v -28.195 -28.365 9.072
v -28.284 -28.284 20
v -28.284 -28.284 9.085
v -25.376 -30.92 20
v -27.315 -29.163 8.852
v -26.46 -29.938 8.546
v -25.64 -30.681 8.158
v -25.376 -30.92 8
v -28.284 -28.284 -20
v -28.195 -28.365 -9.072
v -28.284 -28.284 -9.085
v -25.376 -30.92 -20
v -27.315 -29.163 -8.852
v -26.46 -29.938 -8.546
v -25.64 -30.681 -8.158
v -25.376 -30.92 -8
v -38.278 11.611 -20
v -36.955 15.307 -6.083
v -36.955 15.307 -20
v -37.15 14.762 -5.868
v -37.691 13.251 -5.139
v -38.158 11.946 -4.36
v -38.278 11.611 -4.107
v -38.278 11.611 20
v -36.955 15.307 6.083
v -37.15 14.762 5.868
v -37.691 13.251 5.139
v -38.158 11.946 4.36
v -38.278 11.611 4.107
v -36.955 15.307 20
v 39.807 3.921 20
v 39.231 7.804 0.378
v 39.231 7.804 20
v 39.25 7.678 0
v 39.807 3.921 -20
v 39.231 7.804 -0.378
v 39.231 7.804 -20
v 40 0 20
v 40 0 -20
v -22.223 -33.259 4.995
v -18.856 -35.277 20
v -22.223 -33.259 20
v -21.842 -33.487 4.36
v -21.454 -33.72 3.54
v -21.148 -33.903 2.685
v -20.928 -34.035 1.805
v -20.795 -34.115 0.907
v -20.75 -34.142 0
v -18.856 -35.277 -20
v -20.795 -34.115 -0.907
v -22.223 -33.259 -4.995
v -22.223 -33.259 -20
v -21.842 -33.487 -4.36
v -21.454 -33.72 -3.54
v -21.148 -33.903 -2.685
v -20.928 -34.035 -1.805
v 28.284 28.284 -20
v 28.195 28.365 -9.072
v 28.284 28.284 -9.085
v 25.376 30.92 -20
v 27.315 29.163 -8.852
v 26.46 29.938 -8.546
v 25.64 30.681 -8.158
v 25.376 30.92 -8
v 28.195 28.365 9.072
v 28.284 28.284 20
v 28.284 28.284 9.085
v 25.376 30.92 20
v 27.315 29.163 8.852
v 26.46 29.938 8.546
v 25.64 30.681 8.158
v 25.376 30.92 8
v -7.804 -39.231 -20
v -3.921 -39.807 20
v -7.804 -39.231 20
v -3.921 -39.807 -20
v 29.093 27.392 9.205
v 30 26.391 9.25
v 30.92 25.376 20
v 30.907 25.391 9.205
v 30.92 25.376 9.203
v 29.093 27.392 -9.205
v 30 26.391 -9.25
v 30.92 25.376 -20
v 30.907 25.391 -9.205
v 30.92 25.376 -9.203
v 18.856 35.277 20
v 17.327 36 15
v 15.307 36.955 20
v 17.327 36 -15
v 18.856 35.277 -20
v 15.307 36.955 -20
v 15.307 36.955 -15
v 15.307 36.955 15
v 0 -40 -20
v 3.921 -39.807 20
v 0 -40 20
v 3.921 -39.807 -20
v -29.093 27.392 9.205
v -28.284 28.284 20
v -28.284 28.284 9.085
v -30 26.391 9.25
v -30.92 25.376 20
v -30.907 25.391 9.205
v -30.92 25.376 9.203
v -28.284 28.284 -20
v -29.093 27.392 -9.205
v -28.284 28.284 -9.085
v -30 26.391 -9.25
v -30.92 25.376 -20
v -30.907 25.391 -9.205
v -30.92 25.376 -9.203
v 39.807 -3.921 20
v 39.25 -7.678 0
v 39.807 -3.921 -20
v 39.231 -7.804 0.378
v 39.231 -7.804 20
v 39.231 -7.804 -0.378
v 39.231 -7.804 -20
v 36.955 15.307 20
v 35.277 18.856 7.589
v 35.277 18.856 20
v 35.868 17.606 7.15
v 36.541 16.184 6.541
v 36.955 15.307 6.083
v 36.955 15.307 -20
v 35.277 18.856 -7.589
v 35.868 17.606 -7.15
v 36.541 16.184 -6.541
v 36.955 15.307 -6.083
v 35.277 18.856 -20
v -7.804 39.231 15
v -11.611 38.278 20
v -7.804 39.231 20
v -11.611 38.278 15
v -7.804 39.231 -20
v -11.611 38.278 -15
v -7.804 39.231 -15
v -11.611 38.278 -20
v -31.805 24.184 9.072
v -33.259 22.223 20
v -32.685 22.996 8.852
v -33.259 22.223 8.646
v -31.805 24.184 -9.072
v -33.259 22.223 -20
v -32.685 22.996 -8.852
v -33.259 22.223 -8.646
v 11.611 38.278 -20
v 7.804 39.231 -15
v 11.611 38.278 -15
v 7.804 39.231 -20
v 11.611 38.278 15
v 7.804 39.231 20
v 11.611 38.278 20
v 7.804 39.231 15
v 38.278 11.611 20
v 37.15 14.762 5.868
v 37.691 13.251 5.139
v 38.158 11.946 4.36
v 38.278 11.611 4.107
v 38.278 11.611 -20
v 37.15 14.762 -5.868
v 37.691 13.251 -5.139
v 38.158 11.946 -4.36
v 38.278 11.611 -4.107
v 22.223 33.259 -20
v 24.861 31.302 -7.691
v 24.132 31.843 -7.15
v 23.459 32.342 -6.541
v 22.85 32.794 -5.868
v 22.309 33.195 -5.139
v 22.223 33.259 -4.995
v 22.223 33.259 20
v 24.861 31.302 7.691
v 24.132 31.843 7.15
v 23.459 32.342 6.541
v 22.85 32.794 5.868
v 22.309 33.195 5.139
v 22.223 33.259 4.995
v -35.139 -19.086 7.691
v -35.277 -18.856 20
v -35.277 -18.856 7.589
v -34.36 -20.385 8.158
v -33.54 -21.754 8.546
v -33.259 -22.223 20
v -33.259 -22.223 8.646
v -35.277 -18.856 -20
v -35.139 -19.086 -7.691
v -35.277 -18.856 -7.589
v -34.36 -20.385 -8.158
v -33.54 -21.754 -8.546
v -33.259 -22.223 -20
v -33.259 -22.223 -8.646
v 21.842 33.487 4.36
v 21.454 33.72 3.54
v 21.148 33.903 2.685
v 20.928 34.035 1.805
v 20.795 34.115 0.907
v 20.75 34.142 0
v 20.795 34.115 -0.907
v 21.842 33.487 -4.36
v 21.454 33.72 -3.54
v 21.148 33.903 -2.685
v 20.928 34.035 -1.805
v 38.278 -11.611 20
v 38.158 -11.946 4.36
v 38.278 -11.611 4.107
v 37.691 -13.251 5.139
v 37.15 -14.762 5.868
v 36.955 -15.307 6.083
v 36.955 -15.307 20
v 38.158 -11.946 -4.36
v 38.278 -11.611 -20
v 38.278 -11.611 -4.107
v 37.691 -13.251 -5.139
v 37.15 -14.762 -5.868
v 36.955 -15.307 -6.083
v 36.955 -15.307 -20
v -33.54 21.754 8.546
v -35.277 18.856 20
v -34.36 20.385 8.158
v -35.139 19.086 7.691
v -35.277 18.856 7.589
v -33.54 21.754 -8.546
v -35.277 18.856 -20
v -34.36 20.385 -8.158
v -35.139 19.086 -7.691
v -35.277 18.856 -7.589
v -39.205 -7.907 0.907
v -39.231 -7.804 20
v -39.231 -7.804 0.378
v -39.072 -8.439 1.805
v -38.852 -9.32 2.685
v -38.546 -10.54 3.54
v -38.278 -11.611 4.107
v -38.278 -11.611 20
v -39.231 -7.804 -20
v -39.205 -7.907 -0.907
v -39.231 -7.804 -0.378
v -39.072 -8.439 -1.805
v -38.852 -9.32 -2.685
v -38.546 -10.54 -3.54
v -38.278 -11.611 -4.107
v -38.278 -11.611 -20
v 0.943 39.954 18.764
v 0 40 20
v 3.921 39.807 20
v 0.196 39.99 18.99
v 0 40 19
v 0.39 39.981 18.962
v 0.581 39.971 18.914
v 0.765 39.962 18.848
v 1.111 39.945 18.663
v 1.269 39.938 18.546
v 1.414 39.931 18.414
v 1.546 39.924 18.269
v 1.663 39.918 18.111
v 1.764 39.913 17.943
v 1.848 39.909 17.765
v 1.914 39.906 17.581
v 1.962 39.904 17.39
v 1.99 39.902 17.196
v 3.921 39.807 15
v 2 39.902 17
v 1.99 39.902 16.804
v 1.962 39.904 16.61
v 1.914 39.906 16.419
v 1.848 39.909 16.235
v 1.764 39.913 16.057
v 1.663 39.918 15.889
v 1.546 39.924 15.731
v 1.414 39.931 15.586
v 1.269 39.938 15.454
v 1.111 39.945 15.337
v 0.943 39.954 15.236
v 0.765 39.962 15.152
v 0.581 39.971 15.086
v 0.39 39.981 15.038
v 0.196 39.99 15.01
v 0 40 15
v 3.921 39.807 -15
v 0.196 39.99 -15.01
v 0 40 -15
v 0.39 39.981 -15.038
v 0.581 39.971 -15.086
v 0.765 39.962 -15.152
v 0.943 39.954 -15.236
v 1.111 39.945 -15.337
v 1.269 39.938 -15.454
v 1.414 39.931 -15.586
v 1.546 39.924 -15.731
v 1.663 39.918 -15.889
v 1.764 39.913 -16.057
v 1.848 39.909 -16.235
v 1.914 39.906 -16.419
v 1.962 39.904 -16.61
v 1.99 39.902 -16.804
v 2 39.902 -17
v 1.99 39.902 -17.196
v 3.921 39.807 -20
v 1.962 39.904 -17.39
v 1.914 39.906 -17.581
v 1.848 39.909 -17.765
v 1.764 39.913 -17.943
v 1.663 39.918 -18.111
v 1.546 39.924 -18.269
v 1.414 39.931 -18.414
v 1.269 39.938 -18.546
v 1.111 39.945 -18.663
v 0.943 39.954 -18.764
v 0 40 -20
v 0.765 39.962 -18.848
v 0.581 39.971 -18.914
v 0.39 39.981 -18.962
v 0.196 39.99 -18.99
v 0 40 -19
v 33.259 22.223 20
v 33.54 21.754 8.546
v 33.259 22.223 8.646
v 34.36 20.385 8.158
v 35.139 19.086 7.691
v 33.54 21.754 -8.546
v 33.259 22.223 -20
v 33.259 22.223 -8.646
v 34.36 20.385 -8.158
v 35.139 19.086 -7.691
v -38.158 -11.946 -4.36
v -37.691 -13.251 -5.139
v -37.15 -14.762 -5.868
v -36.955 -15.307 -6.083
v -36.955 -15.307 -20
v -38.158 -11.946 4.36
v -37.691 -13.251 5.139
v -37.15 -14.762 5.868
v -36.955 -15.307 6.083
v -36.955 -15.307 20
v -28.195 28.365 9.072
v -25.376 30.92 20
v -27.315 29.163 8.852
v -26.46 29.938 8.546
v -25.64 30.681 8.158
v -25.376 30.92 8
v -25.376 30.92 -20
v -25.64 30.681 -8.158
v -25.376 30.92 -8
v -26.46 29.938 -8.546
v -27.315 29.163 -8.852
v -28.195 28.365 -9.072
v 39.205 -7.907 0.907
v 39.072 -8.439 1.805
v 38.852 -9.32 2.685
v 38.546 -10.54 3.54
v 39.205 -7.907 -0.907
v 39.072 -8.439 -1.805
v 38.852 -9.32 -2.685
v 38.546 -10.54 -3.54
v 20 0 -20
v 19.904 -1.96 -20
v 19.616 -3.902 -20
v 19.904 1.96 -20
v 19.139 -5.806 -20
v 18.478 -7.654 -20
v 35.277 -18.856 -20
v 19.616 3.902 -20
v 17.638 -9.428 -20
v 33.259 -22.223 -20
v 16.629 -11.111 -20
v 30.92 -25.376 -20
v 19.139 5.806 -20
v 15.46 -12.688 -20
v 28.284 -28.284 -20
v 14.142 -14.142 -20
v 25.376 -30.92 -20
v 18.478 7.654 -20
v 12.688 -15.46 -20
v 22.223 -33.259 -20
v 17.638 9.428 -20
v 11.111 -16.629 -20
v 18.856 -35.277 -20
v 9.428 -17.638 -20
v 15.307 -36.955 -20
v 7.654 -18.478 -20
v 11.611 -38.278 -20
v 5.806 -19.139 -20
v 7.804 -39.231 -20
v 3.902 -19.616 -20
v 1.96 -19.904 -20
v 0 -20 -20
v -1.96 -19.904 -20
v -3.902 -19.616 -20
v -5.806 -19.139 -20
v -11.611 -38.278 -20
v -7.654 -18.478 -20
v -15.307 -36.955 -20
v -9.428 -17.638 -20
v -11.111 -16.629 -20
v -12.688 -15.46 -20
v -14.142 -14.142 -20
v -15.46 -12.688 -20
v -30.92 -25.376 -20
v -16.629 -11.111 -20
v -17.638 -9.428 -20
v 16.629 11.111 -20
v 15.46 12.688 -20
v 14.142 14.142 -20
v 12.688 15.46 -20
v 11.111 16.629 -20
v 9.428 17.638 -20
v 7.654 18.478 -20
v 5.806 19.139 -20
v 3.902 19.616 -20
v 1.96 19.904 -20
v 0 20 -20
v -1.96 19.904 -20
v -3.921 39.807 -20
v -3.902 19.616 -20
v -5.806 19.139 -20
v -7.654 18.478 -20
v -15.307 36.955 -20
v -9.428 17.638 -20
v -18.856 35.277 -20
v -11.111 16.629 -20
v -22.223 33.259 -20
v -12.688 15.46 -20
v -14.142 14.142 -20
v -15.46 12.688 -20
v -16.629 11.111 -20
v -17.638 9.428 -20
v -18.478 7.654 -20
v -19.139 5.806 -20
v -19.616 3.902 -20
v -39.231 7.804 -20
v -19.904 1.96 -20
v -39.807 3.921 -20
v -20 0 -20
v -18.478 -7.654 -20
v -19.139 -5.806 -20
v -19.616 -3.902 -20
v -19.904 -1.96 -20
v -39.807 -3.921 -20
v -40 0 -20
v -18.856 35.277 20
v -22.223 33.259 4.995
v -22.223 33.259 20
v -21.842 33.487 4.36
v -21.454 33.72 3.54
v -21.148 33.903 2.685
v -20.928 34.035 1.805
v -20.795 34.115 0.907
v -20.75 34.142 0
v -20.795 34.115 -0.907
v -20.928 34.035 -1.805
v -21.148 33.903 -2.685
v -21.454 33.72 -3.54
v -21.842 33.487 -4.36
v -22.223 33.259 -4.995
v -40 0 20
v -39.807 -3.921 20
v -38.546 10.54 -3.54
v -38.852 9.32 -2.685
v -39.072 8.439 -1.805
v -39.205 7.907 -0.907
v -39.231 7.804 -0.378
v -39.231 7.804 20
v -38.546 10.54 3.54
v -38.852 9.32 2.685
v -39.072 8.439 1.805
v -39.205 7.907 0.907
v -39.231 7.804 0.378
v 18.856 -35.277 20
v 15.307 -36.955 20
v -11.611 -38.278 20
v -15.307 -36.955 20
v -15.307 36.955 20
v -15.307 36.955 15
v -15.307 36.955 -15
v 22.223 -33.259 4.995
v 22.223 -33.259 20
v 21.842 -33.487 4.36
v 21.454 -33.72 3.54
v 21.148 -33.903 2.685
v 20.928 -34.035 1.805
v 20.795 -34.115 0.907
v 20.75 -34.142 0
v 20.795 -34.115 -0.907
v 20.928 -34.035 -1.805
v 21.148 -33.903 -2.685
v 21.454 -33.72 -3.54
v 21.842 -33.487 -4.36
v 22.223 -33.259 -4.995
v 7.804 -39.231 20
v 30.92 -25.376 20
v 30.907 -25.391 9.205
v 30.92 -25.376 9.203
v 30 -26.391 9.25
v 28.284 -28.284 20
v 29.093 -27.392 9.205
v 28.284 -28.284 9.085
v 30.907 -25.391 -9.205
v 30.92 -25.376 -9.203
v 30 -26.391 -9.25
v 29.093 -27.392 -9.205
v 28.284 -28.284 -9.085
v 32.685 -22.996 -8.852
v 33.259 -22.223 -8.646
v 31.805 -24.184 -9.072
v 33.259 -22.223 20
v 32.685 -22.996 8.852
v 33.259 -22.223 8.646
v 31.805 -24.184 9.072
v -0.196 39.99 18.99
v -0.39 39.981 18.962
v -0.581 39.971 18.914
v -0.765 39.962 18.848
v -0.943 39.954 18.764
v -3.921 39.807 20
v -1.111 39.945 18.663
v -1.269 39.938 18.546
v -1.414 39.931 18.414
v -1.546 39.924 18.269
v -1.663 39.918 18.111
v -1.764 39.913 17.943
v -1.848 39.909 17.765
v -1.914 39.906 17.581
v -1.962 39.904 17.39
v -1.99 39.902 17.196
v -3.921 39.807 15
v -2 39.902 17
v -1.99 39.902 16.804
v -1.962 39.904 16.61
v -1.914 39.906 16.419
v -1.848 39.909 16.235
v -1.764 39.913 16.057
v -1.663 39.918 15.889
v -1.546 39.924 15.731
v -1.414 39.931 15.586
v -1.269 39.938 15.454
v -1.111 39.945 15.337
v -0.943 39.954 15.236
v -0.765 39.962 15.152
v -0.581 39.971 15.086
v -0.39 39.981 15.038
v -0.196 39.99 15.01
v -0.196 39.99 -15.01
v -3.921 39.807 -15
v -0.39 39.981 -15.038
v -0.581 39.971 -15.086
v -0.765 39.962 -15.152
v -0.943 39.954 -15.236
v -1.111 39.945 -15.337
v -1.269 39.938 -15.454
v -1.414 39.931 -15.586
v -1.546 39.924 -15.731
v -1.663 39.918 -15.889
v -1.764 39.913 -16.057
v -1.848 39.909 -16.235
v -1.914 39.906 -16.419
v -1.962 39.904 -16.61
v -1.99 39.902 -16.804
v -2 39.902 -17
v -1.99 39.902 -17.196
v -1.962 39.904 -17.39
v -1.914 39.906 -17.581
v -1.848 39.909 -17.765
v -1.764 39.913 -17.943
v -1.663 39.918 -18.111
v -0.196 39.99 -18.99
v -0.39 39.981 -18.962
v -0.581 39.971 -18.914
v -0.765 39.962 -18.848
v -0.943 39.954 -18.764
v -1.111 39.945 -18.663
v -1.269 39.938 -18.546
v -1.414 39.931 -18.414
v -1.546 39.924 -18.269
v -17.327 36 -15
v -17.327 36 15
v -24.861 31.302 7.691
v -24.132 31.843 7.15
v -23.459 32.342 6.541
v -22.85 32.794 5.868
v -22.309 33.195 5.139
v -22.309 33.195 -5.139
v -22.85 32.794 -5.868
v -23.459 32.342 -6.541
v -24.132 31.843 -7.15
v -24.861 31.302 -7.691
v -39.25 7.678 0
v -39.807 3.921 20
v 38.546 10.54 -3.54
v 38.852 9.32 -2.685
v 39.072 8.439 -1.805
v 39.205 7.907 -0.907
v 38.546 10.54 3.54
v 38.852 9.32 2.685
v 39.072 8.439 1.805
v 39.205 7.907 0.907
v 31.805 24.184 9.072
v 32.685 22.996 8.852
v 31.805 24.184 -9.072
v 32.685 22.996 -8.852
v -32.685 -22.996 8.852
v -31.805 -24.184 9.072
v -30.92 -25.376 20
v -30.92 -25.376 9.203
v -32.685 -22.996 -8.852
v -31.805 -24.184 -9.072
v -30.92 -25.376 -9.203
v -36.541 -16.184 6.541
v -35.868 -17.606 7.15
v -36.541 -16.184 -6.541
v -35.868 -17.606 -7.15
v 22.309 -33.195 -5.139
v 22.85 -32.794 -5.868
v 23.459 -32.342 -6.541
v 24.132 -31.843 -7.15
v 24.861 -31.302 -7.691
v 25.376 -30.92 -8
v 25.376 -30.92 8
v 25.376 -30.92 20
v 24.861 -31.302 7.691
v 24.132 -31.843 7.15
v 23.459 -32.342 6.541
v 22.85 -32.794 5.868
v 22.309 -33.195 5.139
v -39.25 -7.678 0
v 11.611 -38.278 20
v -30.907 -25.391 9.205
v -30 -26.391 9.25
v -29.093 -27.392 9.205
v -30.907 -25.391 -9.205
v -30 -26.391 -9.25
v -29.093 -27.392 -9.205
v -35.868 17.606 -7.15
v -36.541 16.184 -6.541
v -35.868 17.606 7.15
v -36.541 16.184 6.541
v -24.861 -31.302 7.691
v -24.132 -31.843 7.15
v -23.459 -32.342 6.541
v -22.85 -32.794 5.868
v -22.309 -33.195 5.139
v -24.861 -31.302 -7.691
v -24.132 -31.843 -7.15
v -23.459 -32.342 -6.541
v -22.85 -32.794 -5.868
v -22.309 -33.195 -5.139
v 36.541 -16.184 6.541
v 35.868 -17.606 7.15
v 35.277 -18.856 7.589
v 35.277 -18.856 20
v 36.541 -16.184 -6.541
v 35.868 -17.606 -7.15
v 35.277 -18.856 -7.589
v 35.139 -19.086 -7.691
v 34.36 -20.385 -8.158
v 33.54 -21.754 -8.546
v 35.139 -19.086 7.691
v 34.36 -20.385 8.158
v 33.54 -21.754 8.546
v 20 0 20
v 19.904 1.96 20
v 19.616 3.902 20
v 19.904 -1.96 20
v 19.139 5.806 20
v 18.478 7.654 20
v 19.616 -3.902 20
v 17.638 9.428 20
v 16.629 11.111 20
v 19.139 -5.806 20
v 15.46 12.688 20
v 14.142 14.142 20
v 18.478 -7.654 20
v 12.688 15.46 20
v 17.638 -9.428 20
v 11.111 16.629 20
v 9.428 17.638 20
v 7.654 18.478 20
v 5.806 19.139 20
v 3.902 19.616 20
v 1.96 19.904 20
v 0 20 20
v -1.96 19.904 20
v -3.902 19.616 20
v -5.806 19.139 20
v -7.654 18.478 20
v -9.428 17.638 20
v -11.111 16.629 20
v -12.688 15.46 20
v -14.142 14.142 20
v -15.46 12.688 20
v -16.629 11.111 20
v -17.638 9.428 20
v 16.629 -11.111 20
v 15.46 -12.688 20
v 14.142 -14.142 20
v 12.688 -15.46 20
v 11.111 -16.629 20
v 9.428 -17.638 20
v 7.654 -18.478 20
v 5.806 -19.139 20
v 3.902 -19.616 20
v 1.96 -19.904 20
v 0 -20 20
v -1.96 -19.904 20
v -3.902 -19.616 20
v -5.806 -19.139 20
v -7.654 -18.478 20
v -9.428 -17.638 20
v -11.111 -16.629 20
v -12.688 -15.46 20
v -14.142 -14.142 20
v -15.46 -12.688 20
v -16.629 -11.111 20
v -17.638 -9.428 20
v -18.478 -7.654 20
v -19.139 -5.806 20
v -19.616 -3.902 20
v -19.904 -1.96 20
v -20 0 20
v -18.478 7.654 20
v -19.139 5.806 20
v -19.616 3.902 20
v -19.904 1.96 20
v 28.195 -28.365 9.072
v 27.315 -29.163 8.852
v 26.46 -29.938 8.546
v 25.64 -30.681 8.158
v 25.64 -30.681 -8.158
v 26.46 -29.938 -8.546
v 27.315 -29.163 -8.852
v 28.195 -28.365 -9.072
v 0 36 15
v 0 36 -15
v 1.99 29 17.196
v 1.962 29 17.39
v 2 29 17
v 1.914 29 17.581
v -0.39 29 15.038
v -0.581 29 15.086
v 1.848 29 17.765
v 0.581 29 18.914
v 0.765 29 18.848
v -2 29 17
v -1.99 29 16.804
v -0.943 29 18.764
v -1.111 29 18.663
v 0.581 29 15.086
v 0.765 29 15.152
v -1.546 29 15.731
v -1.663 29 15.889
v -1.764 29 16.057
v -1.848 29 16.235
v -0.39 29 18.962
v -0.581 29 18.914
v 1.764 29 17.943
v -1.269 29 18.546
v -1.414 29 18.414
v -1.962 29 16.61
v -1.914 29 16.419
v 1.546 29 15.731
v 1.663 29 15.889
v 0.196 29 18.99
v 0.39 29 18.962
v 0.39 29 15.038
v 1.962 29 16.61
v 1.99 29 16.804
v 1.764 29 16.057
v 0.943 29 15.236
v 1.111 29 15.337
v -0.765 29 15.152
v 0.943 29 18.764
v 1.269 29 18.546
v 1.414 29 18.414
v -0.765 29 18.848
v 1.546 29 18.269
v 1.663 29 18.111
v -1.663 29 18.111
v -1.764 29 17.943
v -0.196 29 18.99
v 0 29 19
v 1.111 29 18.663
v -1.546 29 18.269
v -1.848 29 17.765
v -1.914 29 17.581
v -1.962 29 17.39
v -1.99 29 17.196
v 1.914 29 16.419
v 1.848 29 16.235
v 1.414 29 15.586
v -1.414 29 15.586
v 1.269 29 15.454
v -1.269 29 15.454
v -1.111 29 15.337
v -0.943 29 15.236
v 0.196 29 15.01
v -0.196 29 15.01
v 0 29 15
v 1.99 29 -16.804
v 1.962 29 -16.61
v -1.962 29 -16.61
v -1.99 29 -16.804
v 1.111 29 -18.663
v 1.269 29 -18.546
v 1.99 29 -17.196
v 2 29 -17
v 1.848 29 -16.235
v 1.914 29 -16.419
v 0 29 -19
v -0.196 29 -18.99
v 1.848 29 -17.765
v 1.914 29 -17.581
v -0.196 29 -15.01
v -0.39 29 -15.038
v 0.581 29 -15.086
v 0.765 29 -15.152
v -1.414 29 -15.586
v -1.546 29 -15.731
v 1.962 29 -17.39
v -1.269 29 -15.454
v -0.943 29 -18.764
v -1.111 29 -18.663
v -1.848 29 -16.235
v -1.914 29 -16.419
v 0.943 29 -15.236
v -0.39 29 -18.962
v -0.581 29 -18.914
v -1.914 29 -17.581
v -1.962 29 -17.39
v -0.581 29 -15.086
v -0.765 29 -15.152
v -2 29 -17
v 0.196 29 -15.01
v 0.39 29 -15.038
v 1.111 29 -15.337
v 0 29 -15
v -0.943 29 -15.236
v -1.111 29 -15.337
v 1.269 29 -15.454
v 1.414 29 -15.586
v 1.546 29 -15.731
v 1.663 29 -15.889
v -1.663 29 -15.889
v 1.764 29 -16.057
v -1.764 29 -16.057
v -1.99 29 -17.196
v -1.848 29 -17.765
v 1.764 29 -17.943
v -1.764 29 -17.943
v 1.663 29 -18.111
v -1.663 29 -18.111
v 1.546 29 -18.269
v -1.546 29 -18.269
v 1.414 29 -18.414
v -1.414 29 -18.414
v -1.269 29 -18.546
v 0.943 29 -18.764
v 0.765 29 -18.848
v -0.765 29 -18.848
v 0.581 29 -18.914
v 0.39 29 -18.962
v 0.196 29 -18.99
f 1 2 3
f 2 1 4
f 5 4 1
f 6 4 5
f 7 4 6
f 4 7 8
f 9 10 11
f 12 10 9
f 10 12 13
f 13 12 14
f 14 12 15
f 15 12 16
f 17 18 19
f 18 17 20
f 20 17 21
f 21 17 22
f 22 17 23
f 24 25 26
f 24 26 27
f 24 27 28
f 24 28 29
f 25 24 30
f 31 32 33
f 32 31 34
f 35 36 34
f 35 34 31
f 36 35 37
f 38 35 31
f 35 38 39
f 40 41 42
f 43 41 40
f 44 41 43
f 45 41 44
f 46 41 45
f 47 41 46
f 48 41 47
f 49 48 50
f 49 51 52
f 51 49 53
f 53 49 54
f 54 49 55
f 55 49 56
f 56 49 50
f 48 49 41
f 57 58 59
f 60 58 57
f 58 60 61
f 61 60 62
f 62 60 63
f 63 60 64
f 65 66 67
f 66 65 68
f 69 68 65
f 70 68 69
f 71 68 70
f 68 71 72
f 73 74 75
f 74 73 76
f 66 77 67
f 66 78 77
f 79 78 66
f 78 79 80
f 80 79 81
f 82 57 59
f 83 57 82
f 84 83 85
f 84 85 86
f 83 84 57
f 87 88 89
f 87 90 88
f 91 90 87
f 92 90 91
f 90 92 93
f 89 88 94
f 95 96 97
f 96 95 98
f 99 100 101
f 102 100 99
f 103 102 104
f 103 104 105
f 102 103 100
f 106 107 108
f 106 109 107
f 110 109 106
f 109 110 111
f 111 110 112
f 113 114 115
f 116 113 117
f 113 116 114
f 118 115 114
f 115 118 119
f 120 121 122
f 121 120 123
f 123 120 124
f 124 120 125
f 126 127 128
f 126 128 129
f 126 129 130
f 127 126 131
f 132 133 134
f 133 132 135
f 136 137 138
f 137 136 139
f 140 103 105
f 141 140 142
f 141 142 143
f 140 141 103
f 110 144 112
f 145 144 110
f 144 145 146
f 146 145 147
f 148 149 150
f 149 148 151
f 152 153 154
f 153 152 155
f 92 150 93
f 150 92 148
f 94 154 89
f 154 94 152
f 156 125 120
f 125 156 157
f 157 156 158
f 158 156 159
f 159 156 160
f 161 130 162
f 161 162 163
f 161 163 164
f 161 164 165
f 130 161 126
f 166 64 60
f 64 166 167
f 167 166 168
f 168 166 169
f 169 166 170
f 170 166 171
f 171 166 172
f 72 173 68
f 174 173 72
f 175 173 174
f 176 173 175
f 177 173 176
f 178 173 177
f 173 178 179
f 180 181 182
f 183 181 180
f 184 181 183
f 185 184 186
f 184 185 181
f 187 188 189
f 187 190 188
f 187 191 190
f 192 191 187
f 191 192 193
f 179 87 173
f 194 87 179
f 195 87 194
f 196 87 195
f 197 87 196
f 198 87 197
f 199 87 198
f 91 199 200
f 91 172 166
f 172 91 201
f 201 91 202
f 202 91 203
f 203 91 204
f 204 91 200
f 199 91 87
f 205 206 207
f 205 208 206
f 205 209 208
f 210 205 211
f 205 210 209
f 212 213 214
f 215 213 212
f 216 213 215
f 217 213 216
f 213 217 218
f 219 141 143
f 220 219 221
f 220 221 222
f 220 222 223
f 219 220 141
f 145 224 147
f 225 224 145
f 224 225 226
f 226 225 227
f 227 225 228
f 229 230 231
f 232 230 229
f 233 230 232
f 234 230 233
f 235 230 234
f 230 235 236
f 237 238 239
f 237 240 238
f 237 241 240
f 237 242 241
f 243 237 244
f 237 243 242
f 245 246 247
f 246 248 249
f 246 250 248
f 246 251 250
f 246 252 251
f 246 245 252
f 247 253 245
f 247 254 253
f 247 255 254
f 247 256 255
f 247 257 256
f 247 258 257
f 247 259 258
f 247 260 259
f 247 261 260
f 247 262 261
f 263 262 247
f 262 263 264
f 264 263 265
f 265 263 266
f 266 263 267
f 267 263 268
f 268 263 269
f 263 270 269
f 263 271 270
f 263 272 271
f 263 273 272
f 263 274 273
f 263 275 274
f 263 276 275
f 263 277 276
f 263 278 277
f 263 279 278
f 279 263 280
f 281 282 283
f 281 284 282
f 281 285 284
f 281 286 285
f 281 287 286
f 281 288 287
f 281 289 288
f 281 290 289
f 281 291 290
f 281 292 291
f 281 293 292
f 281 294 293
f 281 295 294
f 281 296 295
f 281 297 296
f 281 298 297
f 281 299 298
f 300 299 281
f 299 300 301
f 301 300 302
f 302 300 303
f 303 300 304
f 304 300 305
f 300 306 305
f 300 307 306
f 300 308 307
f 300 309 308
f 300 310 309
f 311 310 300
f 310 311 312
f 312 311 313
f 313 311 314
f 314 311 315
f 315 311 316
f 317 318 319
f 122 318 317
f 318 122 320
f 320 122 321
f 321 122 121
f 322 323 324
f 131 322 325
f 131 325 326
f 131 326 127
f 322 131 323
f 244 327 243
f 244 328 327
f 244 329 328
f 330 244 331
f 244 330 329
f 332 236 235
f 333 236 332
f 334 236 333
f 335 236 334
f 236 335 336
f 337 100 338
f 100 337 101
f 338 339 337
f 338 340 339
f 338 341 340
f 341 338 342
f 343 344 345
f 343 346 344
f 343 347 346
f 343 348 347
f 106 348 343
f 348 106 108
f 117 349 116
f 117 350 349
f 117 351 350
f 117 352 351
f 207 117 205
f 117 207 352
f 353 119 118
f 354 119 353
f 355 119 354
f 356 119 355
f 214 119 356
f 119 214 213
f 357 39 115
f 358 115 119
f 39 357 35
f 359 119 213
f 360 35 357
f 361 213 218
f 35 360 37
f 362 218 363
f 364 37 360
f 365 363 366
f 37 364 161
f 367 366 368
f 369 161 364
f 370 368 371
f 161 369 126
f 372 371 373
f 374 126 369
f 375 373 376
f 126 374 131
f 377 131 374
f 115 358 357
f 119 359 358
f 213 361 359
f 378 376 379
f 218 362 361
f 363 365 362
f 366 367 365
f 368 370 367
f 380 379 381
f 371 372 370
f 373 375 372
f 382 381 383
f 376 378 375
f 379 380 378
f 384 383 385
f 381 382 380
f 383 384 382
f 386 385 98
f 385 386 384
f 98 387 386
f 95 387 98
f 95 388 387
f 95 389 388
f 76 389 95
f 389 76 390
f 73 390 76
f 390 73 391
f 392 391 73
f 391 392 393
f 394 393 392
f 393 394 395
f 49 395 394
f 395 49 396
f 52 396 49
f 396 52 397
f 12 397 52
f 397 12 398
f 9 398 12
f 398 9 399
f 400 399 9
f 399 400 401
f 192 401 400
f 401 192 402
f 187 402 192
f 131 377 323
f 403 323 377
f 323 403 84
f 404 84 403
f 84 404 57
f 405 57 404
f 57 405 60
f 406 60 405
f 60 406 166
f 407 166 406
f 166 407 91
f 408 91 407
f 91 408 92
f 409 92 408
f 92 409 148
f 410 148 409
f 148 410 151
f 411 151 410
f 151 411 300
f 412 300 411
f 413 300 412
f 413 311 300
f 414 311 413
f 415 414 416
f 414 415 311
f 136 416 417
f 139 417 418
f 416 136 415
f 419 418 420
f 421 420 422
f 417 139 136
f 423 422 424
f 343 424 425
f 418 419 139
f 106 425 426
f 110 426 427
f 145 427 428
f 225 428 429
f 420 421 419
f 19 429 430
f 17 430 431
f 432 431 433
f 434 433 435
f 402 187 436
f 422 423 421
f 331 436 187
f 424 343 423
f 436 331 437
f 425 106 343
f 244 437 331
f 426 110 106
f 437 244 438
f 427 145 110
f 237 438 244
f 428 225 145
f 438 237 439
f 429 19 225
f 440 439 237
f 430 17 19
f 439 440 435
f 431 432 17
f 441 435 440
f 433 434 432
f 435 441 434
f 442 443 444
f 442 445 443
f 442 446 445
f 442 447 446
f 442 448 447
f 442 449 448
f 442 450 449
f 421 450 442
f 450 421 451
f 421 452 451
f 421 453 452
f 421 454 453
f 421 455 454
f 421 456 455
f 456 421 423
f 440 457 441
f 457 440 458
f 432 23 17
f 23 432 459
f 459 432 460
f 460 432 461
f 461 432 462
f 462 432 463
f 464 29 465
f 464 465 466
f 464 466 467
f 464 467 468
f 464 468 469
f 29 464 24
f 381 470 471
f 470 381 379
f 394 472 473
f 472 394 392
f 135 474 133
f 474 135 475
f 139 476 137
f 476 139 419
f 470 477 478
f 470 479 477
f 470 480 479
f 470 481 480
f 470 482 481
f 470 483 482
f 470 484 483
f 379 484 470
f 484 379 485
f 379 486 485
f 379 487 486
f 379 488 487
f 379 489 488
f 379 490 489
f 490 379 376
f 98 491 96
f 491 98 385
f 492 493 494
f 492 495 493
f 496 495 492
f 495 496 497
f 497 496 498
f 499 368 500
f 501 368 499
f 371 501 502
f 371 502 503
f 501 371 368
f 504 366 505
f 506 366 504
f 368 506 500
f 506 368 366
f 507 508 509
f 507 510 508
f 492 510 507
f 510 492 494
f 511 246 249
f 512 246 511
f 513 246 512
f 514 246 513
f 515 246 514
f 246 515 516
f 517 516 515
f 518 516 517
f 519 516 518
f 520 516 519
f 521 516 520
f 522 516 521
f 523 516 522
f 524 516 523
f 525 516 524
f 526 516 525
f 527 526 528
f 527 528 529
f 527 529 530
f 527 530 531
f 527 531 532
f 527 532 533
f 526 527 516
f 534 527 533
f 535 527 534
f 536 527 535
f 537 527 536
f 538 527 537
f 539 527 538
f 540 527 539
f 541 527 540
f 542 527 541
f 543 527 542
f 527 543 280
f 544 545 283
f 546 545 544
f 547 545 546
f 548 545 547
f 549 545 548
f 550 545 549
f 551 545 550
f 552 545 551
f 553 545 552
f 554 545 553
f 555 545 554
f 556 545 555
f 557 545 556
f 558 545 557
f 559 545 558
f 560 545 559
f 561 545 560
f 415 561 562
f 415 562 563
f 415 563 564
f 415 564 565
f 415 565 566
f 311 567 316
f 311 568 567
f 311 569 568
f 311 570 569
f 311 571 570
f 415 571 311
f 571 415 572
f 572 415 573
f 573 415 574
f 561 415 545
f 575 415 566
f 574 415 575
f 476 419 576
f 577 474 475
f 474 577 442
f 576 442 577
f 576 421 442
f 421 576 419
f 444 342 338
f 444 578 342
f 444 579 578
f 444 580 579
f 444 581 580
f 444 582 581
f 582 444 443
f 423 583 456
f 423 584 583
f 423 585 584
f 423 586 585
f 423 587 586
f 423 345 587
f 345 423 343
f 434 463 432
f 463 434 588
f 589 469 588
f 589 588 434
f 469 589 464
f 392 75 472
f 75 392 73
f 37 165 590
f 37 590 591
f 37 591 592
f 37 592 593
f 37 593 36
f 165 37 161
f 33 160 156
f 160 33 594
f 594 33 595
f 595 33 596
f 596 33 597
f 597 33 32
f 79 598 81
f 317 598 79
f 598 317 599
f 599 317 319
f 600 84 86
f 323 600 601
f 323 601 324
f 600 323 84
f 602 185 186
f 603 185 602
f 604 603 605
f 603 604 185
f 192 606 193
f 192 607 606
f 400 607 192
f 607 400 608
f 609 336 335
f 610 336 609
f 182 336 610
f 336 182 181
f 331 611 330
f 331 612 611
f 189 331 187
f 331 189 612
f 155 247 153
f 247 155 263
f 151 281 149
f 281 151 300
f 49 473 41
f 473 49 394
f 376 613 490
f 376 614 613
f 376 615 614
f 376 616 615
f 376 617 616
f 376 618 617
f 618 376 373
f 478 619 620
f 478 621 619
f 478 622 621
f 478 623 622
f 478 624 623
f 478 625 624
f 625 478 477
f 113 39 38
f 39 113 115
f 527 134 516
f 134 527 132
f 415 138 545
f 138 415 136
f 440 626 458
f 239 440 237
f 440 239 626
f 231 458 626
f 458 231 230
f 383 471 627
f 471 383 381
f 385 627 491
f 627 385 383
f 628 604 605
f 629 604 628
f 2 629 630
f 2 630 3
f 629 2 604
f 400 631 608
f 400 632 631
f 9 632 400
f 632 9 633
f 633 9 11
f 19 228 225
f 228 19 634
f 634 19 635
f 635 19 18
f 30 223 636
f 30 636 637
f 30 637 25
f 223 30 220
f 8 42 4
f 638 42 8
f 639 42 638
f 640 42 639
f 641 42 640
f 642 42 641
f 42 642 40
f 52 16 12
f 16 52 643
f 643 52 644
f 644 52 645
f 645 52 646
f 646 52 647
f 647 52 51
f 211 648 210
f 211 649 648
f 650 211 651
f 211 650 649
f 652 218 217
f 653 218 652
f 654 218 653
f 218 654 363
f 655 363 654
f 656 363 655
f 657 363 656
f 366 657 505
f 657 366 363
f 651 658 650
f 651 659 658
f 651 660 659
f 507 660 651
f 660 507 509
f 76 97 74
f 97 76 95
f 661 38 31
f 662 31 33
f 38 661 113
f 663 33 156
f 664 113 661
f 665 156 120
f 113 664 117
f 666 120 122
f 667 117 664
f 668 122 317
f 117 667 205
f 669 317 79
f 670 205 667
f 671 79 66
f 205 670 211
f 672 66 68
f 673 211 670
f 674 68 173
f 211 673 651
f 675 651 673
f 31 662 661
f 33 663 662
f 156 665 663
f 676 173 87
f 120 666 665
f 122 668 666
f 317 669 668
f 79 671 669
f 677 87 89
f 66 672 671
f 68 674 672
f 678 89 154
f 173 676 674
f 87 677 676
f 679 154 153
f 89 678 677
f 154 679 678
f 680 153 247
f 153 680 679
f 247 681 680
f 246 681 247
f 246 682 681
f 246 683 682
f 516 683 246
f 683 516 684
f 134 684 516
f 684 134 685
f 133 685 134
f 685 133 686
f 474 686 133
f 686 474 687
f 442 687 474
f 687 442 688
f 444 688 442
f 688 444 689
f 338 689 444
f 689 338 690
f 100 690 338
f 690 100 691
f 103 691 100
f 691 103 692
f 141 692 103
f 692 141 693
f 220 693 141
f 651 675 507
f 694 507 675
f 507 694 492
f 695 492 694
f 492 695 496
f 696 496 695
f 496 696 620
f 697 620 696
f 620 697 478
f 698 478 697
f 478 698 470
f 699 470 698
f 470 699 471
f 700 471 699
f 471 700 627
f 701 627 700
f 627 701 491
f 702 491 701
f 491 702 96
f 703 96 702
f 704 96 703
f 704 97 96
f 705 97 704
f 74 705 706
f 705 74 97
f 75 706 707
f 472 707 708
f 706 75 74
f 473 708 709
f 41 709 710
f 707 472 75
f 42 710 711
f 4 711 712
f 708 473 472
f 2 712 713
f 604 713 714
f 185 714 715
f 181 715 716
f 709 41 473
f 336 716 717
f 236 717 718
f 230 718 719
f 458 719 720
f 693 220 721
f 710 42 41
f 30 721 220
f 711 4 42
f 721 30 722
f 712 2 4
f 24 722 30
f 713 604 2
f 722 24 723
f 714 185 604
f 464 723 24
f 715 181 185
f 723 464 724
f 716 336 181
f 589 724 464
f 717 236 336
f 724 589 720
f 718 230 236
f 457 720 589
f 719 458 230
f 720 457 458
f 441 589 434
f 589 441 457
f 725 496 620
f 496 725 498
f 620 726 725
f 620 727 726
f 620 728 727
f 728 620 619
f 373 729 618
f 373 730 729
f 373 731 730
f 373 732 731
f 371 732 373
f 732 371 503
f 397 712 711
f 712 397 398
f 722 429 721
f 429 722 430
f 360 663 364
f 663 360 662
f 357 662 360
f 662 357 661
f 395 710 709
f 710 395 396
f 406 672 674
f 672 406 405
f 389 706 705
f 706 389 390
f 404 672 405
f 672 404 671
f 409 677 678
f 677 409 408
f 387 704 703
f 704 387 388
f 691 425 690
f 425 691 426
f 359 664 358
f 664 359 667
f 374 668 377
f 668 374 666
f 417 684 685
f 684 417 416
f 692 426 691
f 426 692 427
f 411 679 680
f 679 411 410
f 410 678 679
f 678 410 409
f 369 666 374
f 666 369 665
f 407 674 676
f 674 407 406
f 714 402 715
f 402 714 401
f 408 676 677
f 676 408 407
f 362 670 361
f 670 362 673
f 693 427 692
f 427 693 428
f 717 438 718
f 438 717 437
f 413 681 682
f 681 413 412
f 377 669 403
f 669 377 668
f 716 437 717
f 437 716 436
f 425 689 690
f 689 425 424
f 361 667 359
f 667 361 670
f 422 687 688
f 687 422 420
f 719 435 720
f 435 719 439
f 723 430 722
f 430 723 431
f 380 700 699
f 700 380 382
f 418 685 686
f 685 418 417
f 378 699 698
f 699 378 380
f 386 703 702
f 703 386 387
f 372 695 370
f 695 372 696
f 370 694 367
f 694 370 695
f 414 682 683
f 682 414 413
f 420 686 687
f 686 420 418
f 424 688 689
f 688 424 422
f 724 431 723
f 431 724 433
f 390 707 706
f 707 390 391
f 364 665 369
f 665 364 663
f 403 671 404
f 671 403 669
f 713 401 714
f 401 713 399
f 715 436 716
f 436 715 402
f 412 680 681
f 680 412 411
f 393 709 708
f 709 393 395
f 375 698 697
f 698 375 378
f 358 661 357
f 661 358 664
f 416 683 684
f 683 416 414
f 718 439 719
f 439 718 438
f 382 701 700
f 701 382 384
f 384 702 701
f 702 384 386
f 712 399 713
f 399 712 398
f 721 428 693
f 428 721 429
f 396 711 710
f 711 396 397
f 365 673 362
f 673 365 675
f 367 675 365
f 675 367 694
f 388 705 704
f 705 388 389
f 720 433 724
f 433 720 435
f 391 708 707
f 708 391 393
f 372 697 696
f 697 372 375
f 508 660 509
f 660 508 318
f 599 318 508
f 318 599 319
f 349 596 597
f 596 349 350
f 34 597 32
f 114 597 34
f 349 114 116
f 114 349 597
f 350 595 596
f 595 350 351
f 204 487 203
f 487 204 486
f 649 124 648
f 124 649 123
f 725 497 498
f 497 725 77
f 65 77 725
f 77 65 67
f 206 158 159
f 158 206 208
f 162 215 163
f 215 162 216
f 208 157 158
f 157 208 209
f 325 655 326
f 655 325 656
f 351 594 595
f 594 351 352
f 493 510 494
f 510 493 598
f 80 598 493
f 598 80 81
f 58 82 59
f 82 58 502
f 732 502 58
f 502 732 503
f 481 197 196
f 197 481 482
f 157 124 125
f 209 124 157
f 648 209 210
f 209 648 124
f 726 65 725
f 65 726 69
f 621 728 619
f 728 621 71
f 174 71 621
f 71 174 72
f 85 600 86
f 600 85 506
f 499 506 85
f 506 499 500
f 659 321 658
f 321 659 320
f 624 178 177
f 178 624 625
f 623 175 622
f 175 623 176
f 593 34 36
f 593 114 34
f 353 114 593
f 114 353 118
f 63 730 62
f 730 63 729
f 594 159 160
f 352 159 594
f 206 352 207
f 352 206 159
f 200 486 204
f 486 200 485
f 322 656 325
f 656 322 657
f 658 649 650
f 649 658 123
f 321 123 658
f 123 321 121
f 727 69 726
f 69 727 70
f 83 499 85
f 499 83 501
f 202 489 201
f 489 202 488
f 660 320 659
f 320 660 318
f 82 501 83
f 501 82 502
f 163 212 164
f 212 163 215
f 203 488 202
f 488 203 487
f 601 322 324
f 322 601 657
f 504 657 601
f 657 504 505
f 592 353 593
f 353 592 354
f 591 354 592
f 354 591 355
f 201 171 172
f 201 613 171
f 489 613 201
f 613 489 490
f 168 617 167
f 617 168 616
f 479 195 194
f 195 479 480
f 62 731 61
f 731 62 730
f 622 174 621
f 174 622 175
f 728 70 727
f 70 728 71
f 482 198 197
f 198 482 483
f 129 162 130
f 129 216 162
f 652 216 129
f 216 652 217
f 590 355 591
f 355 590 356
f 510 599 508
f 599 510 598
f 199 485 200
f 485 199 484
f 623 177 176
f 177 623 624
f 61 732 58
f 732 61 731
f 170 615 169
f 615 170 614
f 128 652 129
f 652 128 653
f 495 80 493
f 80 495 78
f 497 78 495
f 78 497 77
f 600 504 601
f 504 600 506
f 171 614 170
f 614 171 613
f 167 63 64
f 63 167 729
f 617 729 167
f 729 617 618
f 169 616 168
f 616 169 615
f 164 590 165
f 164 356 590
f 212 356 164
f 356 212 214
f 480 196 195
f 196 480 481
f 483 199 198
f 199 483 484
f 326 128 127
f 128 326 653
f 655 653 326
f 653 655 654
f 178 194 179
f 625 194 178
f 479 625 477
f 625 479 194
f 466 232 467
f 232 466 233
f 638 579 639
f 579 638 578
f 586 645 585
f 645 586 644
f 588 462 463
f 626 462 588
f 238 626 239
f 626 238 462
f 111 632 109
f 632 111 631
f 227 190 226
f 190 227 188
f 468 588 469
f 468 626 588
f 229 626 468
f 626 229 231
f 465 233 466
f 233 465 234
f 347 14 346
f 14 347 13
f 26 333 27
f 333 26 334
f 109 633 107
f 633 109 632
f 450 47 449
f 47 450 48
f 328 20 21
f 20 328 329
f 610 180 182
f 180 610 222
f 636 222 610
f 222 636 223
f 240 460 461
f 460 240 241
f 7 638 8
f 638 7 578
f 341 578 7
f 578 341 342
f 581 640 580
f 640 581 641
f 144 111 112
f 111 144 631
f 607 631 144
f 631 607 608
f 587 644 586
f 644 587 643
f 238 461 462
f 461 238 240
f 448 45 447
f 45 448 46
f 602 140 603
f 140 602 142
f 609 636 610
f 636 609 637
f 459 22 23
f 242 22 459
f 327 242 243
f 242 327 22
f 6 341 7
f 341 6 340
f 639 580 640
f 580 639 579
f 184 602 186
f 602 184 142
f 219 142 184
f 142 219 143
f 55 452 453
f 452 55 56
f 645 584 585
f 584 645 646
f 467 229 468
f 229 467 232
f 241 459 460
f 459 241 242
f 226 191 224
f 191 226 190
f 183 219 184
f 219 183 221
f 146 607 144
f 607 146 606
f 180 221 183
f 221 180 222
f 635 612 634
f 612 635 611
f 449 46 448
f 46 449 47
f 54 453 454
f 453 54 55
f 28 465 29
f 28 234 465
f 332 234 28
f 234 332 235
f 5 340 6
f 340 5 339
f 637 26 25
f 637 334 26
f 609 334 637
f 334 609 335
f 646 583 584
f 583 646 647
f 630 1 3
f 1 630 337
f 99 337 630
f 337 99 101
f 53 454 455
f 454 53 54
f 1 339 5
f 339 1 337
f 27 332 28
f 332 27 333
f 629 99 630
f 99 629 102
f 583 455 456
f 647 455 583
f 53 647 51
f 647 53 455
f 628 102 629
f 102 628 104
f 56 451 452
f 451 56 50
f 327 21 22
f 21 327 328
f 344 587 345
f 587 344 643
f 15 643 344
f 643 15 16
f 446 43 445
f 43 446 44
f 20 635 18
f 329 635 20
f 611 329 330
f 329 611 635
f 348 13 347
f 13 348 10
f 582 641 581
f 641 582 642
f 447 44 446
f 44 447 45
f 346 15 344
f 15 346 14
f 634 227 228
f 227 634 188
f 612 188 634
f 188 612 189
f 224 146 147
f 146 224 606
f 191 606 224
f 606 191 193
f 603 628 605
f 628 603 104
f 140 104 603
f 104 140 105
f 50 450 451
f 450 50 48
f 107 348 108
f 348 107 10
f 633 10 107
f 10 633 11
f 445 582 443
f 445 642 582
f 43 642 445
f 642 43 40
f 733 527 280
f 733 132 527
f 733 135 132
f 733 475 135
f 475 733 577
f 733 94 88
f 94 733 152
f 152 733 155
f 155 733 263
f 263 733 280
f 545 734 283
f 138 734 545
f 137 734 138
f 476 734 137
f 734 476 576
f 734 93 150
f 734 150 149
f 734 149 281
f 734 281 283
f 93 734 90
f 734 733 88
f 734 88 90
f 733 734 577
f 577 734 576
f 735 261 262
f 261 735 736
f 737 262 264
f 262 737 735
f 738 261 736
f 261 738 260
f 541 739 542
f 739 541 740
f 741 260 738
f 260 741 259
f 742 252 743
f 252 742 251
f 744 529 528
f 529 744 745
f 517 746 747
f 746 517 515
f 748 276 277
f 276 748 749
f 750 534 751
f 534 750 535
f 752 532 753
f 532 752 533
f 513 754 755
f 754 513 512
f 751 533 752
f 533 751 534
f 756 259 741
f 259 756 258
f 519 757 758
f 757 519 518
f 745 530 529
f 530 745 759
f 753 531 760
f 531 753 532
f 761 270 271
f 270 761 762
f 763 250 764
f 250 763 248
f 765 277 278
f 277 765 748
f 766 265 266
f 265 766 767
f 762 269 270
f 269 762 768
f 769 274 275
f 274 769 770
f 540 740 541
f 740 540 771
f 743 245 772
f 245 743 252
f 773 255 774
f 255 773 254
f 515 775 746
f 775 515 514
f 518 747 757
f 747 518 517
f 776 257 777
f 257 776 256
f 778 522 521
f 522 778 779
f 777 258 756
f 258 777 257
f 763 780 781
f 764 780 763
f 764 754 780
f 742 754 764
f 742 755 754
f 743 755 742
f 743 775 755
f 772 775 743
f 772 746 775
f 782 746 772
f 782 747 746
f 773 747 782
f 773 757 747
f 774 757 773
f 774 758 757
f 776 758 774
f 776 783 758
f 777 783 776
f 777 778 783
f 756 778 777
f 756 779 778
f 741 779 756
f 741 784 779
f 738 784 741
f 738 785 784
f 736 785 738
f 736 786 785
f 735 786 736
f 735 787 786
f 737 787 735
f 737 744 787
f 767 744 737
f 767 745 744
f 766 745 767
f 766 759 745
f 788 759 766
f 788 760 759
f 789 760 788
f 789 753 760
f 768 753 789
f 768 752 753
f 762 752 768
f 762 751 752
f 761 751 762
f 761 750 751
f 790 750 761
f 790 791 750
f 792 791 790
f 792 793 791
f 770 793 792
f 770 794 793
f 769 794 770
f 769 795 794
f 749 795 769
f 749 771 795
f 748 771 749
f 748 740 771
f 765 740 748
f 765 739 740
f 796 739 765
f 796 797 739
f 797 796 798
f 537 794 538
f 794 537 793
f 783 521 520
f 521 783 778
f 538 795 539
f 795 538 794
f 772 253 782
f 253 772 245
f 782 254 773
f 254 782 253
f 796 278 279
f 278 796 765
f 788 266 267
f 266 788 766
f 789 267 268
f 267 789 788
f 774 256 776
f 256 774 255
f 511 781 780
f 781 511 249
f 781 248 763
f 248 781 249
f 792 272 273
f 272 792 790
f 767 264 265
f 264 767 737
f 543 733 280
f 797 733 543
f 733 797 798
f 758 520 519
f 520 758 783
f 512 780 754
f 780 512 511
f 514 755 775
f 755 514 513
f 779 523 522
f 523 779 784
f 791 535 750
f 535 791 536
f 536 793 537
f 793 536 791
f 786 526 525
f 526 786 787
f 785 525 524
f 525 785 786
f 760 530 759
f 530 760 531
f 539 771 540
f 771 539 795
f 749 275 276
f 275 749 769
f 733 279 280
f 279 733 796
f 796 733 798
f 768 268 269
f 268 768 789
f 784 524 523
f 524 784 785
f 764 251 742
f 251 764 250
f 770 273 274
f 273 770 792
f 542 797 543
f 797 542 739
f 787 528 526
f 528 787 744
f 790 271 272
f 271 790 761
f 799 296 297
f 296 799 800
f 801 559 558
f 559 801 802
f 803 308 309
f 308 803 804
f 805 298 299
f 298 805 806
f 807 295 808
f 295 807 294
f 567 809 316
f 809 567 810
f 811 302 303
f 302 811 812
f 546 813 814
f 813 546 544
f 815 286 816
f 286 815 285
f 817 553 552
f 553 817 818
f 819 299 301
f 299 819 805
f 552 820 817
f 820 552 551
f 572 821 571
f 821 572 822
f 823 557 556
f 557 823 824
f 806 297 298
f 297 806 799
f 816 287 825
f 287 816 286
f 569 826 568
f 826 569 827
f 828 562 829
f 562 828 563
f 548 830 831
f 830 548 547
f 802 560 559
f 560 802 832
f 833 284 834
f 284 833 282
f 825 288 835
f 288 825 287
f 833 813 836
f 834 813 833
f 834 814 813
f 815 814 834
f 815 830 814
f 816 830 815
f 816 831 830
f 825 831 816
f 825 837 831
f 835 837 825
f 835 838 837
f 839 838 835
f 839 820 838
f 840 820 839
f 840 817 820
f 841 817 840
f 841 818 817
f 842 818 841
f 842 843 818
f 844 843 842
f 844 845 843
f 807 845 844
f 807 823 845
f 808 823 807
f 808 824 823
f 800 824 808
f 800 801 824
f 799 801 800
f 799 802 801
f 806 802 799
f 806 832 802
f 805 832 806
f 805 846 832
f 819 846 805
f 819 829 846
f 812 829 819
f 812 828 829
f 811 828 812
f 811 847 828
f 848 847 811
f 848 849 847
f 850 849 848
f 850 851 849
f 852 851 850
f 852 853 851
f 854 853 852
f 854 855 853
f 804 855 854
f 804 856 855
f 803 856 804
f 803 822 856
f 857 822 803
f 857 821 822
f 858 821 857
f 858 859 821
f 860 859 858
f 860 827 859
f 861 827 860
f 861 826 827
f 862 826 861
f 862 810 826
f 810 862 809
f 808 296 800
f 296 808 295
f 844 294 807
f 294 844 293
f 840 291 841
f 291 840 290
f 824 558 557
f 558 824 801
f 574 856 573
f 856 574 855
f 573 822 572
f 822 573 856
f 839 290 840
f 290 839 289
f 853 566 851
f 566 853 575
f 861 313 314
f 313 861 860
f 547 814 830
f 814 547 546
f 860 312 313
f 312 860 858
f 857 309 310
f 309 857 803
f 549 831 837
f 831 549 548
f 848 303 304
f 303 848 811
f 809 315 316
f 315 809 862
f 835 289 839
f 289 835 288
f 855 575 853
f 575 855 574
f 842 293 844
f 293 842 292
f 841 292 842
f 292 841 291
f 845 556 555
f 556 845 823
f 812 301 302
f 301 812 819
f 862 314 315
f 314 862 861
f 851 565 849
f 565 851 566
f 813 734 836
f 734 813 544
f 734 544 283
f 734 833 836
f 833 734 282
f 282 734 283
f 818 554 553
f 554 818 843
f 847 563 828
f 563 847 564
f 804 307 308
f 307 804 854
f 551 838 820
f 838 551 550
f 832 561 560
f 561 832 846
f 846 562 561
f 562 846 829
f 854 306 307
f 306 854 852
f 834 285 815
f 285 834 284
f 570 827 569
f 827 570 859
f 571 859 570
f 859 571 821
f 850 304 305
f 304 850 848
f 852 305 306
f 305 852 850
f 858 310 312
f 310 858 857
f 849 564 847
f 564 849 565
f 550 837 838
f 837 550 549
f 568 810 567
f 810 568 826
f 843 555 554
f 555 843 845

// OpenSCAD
// COBRA Vertebra - T11 V17
// Height: 40.0mm, OD: 80.0mm

$fn = 64;

difference() {
    // Outer cylinder
    cylinder(h=40.0, d=80.0, center=true);
    
    // Inner channel
    cylinder(h=42.0, d=40.0, center=true);

    // Battery cavity 1
    rotate([0, 0, 0])
    translate([30.0, 0, 0])
    rotate([90, 0, 0])
    cylinder(h=74.0, d=18.5, center=true);

    // Battery cavity 2
    rotate([0, 0, 180])
    translate([30.0, 0, 0])
    rotate([90, 0, 0])
    cylinder(h=74.0, d=18.5, center=true);

    // Solar panel cavity
    translate([0, 38.0, 0])
    cube([50, 4, 30], center=true);

    // Pivot holes
    translate([0, 40.0, 17.0])
    rotate([90, 0, 0])
    cylinder(h=22.0, d=4, center=true);
    
    translate([0, 40.0, -17.0])
    rotate([90, 0, 0])
    cylinder(h=22.0, d=4, center=true);
}
